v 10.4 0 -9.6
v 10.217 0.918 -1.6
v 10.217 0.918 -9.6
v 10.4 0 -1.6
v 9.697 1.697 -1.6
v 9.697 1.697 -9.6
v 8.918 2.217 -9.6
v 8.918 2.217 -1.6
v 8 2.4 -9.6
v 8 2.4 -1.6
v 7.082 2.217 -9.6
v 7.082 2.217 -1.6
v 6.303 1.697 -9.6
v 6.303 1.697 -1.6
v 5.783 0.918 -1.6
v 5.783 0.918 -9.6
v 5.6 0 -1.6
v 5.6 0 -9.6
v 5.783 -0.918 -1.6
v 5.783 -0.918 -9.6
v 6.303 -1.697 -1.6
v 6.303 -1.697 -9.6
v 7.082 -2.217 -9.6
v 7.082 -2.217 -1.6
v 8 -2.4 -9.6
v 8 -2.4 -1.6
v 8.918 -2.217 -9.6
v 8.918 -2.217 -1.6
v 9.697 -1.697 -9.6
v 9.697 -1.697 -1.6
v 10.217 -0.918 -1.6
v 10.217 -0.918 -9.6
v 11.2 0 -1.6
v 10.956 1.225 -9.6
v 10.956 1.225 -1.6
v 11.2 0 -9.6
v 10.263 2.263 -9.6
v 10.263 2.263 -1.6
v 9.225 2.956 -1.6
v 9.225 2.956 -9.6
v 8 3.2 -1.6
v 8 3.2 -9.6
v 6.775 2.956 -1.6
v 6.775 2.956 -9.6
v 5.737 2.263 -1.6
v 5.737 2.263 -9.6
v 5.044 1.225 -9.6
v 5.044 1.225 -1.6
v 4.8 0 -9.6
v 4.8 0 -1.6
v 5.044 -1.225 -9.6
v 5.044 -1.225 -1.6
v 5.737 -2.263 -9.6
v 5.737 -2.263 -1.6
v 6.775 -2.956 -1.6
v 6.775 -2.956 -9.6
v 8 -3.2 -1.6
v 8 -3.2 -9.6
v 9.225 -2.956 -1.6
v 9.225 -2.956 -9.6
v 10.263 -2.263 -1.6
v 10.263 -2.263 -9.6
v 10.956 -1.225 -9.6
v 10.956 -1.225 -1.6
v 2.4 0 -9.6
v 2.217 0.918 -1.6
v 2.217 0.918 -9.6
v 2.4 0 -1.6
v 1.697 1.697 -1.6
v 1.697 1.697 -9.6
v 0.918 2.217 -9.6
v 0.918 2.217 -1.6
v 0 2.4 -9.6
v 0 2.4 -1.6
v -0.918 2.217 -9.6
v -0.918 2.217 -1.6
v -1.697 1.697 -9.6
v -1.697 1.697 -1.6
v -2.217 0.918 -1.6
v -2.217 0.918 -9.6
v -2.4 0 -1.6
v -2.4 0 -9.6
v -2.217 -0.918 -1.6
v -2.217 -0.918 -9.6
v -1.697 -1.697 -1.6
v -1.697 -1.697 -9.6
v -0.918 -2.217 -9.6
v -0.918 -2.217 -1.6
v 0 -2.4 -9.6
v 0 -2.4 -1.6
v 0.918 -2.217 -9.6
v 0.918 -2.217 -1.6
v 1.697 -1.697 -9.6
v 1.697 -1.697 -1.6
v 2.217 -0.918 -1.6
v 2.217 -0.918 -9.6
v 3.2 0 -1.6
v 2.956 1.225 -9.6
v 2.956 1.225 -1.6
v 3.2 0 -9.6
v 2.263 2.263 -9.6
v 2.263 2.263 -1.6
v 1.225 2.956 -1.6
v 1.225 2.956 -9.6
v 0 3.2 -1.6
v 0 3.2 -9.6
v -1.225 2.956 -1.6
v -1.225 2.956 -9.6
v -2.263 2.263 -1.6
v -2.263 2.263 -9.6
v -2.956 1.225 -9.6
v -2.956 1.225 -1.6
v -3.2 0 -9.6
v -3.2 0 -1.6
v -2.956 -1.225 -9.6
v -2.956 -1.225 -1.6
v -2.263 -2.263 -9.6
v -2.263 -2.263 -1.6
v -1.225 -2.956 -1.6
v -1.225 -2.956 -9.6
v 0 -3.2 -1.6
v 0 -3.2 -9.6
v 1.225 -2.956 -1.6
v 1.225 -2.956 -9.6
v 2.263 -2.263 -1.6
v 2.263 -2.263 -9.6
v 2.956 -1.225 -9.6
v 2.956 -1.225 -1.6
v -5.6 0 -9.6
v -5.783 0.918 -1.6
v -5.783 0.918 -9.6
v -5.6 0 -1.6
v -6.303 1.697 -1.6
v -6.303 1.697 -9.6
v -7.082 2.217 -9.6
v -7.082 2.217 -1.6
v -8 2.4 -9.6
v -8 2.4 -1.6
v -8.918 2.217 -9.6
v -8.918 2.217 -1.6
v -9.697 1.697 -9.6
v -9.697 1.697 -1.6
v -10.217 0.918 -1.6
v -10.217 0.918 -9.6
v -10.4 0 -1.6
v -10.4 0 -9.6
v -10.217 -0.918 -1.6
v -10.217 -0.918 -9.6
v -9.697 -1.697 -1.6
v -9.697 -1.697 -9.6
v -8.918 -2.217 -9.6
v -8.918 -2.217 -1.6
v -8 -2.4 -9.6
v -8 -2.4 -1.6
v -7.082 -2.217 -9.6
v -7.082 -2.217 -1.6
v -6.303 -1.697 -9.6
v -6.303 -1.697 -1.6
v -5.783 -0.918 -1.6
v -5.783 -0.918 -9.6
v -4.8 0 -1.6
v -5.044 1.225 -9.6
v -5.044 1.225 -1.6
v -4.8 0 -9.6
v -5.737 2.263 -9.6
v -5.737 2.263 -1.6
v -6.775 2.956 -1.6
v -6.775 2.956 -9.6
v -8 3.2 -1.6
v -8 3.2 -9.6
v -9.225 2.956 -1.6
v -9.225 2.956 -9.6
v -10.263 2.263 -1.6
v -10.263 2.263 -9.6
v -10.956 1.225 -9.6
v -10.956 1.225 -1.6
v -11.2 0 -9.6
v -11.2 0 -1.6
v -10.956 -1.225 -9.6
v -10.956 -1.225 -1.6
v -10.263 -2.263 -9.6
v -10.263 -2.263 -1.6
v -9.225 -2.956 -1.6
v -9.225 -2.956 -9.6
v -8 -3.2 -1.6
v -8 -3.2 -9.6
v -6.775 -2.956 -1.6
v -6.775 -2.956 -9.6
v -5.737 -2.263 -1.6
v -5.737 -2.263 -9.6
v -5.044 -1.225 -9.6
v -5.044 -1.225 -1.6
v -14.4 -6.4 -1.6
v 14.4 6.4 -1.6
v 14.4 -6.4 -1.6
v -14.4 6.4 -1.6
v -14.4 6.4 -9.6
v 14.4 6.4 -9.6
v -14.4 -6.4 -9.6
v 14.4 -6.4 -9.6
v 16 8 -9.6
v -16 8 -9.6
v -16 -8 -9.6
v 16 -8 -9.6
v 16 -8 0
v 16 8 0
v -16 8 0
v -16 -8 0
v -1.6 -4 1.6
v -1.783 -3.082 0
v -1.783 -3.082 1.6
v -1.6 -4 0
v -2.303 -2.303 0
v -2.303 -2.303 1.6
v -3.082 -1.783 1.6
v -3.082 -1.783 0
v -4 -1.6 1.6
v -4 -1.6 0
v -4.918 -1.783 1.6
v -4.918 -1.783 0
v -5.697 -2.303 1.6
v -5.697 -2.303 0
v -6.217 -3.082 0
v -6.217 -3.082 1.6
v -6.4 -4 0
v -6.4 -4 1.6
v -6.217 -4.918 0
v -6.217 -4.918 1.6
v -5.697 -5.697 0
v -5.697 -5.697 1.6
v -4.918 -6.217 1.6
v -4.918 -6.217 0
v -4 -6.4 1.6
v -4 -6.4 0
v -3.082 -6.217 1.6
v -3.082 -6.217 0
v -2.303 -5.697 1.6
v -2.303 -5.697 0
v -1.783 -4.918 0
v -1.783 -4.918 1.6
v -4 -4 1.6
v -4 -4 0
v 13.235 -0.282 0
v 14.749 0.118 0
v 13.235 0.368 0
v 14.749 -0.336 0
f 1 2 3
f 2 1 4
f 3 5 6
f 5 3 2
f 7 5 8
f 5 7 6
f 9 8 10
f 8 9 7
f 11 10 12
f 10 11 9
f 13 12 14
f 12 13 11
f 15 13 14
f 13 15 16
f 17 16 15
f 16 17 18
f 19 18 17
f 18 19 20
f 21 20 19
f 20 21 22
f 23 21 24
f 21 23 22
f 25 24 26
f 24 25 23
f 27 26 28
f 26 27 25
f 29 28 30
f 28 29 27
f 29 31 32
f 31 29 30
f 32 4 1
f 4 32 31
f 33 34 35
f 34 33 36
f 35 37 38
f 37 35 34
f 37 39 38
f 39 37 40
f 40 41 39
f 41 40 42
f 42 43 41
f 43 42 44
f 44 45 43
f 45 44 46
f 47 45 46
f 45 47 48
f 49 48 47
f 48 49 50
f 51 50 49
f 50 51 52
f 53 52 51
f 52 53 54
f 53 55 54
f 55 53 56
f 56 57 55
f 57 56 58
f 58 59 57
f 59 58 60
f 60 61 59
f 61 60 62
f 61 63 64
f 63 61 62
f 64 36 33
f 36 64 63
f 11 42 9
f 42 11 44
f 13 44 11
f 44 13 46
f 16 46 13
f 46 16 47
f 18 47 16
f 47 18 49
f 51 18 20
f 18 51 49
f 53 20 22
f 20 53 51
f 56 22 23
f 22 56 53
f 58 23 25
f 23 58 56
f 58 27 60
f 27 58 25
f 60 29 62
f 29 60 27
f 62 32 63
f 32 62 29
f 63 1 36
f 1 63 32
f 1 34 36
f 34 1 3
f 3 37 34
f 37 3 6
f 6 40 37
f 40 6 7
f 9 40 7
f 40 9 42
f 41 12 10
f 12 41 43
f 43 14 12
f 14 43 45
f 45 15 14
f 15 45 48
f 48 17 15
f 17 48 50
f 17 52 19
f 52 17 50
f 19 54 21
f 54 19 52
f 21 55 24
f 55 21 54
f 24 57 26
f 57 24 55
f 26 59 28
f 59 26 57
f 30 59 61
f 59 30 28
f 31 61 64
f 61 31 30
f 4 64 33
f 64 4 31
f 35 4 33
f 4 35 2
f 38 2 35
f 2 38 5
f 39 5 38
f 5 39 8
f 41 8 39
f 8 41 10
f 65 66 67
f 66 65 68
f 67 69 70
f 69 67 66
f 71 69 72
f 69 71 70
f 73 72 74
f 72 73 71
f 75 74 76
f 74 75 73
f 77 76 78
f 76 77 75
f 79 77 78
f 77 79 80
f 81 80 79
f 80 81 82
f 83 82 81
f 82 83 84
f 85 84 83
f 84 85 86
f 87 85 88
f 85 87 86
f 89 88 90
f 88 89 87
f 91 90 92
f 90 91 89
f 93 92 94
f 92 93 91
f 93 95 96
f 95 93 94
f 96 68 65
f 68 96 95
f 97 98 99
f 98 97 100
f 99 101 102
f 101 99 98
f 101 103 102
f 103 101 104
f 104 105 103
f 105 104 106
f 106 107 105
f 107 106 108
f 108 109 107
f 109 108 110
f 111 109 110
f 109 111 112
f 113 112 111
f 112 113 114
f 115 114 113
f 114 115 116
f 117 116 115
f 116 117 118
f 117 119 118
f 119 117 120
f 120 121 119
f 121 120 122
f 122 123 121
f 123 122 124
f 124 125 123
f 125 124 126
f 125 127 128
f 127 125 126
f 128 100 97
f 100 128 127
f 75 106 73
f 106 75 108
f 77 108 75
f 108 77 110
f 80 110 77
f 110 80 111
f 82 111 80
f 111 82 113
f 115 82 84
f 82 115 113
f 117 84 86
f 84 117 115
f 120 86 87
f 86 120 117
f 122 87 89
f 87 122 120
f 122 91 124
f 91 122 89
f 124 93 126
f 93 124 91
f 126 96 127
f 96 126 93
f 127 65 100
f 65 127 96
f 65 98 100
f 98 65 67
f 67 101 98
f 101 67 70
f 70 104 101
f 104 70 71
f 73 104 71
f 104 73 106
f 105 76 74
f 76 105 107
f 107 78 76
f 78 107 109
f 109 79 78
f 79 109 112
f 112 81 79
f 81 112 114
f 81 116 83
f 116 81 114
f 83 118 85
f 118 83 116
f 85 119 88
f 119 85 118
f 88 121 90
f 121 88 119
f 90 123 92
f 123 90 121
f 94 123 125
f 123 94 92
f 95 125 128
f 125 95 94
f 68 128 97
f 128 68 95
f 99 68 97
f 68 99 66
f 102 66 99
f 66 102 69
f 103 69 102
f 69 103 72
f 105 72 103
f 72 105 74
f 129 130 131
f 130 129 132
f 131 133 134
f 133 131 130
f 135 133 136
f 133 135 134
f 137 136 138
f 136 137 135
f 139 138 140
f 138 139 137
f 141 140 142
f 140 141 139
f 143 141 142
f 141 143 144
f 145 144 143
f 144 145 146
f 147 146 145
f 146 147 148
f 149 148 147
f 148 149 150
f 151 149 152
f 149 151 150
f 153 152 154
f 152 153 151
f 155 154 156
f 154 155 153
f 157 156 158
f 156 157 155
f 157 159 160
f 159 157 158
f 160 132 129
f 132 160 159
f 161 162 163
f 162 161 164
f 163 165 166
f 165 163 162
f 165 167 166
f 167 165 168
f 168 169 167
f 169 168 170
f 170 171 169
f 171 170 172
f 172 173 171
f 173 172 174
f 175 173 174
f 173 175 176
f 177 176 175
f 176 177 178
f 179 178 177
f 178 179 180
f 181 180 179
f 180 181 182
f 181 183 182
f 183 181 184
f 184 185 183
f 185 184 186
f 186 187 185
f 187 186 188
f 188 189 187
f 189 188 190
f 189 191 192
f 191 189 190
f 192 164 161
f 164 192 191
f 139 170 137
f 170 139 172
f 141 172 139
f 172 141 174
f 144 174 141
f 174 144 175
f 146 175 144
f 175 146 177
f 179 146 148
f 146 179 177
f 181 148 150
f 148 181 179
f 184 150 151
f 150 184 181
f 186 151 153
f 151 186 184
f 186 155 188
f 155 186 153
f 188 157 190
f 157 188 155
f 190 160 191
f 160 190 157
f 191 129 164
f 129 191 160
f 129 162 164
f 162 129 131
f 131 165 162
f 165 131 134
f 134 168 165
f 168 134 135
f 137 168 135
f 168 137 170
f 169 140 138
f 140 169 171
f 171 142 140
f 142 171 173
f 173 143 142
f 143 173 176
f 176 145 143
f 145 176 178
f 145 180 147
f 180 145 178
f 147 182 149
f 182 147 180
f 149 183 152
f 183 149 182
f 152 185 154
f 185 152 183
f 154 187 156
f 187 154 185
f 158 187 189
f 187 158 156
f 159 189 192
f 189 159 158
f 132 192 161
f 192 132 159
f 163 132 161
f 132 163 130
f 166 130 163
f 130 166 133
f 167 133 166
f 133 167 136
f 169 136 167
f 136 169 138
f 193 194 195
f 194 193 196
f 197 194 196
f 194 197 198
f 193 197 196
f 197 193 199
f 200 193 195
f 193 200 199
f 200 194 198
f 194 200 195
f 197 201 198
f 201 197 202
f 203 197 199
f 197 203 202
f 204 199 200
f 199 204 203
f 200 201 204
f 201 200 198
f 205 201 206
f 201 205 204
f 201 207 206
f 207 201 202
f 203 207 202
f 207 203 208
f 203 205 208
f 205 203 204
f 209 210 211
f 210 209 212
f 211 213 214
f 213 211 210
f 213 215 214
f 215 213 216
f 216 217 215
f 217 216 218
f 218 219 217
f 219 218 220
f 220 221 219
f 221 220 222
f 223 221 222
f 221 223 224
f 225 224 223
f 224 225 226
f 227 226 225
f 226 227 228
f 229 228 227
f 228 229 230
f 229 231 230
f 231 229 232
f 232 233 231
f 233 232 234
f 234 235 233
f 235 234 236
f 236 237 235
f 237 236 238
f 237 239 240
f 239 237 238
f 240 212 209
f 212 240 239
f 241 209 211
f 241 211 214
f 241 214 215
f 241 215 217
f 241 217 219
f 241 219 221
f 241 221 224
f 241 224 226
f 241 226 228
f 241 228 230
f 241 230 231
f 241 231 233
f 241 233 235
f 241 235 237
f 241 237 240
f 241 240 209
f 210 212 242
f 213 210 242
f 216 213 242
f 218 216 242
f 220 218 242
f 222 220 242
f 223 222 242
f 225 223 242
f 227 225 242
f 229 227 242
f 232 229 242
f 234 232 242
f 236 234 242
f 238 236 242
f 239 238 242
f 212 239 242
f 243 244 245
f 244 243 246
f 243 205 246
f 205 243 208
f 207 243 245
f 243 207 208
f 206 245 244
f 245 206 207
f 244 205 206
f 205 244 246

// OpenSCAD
// file: ../p/4-4ring3.scad
use <../lib.scad>
$fa=1; $fs=0.2;
function ldraw_lib__4_4ring3(realsolid=false) = [
// 0 Ring  3 x 1.0
// 0 Name: 4-4ring3.dat
// 0 Author: James Jessiman
// 0 !LDRAW_ORG Primitive UPDATE 2009-01
// 0 !LICENSE Licensed under CC BY 2.0 and CC BY 4.0 : see CAreadme.txt
// 
// 0 BFC CERTIFY CCW
  [0,"BFC","CERTIFY"],
  [0,"BFC","CCW"],
// 
// 0 !HISTORY 1998-12-15 [PTadmin] Official Update 1998-10
// 0 !HISTORY 2002-04-05 [hafhead] Added BFC statement
// 0 !HISTORY 2002-04-25 [PTadmin] Official Update 2002-02
// 0 !HISTORY 2007-06-24 [PTadmin] Header formatted for Contributor Agreement
// 0 !HISTORY 2008-07-01 [PTadmin] Official Update 2008-01
// 0 !HISTORY 2008-08-26 [cwdee] Switch polygon winding and rename
// 0 !HISTORY 2009-05-02 [PTadmin] Official Update 2009-01
// 
// 
// 4 16 -1.5308 0 3.6956 -1.1481 0 2.7717 0 0 3 0 0 4
  [4,16,-1.5308,0,3.6956,-1.1481,0,2.7717,0,0,3,0,0,4],
// 4 16 -2.8284 0 2.8284 -2.1213 0 2.1213 -1.1481 0 2.7717 -1.5308 0 3.6956
  [4,16,-2.8284,0,2.8284,-2.1213,0,2.1213,-1.1481,0,2.7717,-1.5308,0,3.6956],
// 4 16 -3.6956 0 1.5308 -2.7717 0 1.1481 -2.1213 0 2.1213 -2.8284 0 2.8284
  [4,16,-3.6956,0,1.5308,-2.7717,0,1.1481,-2.1213,0,2.1213,-2.8284,0,2.8284],
// 4 16 -4 0 0 -3 0 0 -2.7717 0 1.1481 -3.6956 0 1.5308
  [4,16,-4,0,0,-3,0,0,-2.7717,0,1.1481,-3.6956,0,1.5308],
// 4 16 -3.6956 0 -1.5308 -2.7717 0 -1.1481 -3 0 0 -4 0 0
  [4,16,-3.6956,0,-1.5308,-2.7717,0,-1.1481,-3,0,0,-4,0,0],
// 4 16 -2.8284 0 -2.8284 -2.1213 0 -2.1213 -2.7717 0 -1.1481 -3.6956 0 -1.5308
  [4,16,-2.8284,0,-2.8284,-2.1213,0,-2.1213,-2.7717,0,-1.1481,-3.6956,0,-1.5308],
// 4 16 -1.5308 0 -3.6956 -1.1481 0 -2.7717 -2.1213 0 -2.1213 -2.8284 0 -2.8284
  [4,16,-1.5308,0,-3.6956,-1.1481,0,-2.7717,-2.1213,0,-2.1213,-2.8284,0,-2.8284],
// 4 16 0 0 -4 0 0 -3 -1.1481 0 -2.7717 -1.5308 0 -3.6956
  [4,16,0,0,-4,0,0,-3,-1.1481,0,-2.7717,-1.5308,0,-3.6956],
// 4 16 1.5308 0 -3.6956 1.1481 0 -2.7717 0 0 -3 0 0 -4
  [4,16,1.5308,0,-3.6956,1.1481,0,-2.7717,0,0,-3,0,0,-4],
// 4 16 2.8284 0 -2.8284 2.1213 0 -2.1213 1.1481 0 -2.7717 1.5308 0 -3.6956
  [4,16,2.8284,0,-2.8284,2.1213,0,-2.1213,1.1481,0,-2.7717,1.5308,0,-3.6956],
// 4 16 3.6956 0 -1.5308 2.7717 0 -1.1481 2.1213 0 -2.1213 2.8284 0 -2.8284
  [4,16,3.6956,0,-1.5308,2.7717,0,-1.1481,2.1213,0,-2.1213,2.8284,0,-2.8284],
// 4 16 4 0 0 3 0 0 2.7717 0 -1.1481 3.6956 0 -1.5308
  [4,16,4,0,0,3,0,0,2.7717,0,-1.1481,3.6956,0,-1.5308],
// 4 16 3.6956 0 1.5308 2.7717 0 1.1481 3 0 0 4 0 0
  [4,16,3.6956,0,1.5308,2.7717,0,1.1481,3,0,0,4,0,0],
// 4 16 2.8284 0 2.8284 2.1213 0 2.1213 2.7717 0 1.1481 3.6956 0 1.5308
  [4,16,2.8284,0,2.8284,2.1213,0,2.1213,2.7717,0,1.1481,3.6956,0,1.5308],
// 4 16 1.5308 0 3.6956 1.1481 0 2.7717 2.1213 0 2.1213 2.8284 0 2.8284
  [4,16,1.5308,0,3.6956,1.1481,0,2.7717,2.1213,0,2.1213,2.8284,0,2.8284],
// 4 16 0 0 4 0 0 3 1.1481 0 2.7717 1.5308 0 3.6956
  [4,16,0,0,4,0,0,3,1.1481,0,2.7717,1.5308,0,3.6956],
// 0
];
module ldraw_lib__4_4ring3(step=0, col=false, unit=2/5, alt=false, line=0.2, solid=!$preview)
    makepoly(ldraw_lib__4_4ring3(solid), step=step, col=col, unit=unit, alt=alt, line=line, solid=solid);
ldraw_lib__4_4ring3(line=0.2);
// file: ../p/4-4edge.scad
use <../lib.scad>
function ldraw_lib__4_4edge() = [
// 0 Circle 1.0
// 0 Name: 4-4edge.dat
// 0 Author: James Jessiman
// 0 !LDRAW_ORG Primitive UPDATE 2017-01
// 0 !LICENSE Licensed under CC BY 2.0 and CC BY 4.0 : see CAreadme.txt
// 
// 0 BFC CERTIFY CCW
  [0,"BFC","CERTIFY"],
  [0,"BFC","CCW"],
// 
// 0 !HISTORY 1998-12-15 [PTadmin] Official Update 1998-10
// 0 !HISTORY 2005-12-28 [PTadmin] Official Update 2005-01
// 0 !HISTORY 2007-06-24 [PTadmin] Header formatted for Contributor Agreement
// 0 !HISTORY 2008-07-01 [PTadmin] Official Update 2008-01
// 0 !HISTORY 2017-01-15 [Steffen] BFCed
// 0 !HISTORY 2017-12-30 [PTadmin] Official Update 2017-01
// 
// 
// 2 24 1 0 0 0.9239 0 0.3827
  [2,24,1,0,0,0.9239,0,0.3827],
// 2 24 0.9239 0 0.3827 0.7071 0 0.7071
  [2,24,0.9239,0,0.3827,0.7071,0,0.7071],
// 2 24 0.7071 0 0.7071 0.3827 0 0.9239
  [2,24,0.7071,0,0.7071,0.3827,0,0.9239],
// 2 24 0.3827 0 0.9239 0 0 1
  [2,24,0.3827,0,0.9239,0,0,1],
// 2 24 0 0 1 -0.3827 0 0.9239
  [2,24,0,0,1,-0.3827,0,0.9239],
// 2 24 -0.3827 0 0.9239 -0.7071 0 0.7071
  [2,24,-0.3827,0,0.9239,-0.7071,0,0.7071],
// 2 24 -0.7071 0 0.7071 -0.9239 0 0.3827
  [2,24,-0.7071,0,0.7071,-0.9239,0,0.3827],
// 2 24 -0.9239 0 0.3827 -1 0 -0
  [2,24,-0.9239,0,0.3827,-1,0,-0],
// 2 24 -1 0 -0 -0.9239 0 -0.3827
  [2,24,-1,0,-0,-0.9239,0,-0.3827],
// 2 24 -0.9239 0 -0.3827 -0.7071 0 -0.7071
  [2,24,-0.9239,0,-0.3827,-0.7071,0,-0.7071],
// 2 24 -0.7071 0 -0.7071 -0.3827 0 -0.9239
  [2,24,-0.7071,0,-0.7071,-0.3827,0,-0.9239],
// 2 24 -0.3827 0 -0.9239 0 0 -1
  [2,24,-0.3827,0,-0.9239,0,0,-1],
// 2 24 0 0 -1 0.3827 0 -0.9239
  [2,24,0,0,-1,0.3827,0,-0.9239],
// 2 24 0.3827 0 -0.9239 0.7071 0 -0.7071
  [2,24,0.3827,0,-0.9239,0.7071,0,-0.7071],
// 2 24 0.7071 0 -0.7071 0.9239 0 -0.3827
  [2,24,0.7071,0,-0.7071,0.9239,0,-0.3827],
// 2 24 0.9239 0 -0.3827 1 0 0
  [2,24,0.9239,0,-0.3827,1,0,0],
];
module ldraw_lib__4_4edge(step=0, col=false, unit=2/5, alt=false, line=0.2, solid=!$preview)
    makepoly(ldraw_lib__4_4edge(), step=step, col=col, unit=unit, alt=alt, line=line, solid=solid);
ldraw_lib__4_4edge(line=0.2);
// file: ../p/4-4disc.scad
use <../lib.scad>
function ldraw_lib__4_4disc() = [
// 0 Disc 1.0
// 0 Name: 4-4disc.dat
// 0 Author: James Jessiman
// 0 !LDRAW_ORG Primitive UPDATE 2002-02
// 0 !LICENSE Licensed under CC BY 2.0 and CC BY 4.0 : see CAreadme.txt
// 
// 0 BFC CERTIFY CCW
  [0,"BFC","CERTIFY"],
  [0,"BFC","CCW"],
// 
// 0 !HISTORY 1998-12-15 [PTadmin] Official Update 1998-10
// 0 !HISTORY 2002-03-23 [sbliss] Added BFC statement
// 0 !HISTORY 2002-04-25 [PTadmin] Official Update 2002-02
// 0 !HISTORY 2007-06-24 [PTadmin] Header formatted for Contributor Agreement
// 0 !HISTORY 2008-07-01 [PTadmin] Official Update 2008-01
// 
// 
// 3 16 0 0 0 1 0 0 0.9239 0 0.3827
  [3,16,0,0,0,1,0,0,0.9239,0,0.3827],
// 3 16 0 0 0 0.9239 0 0.3827 0.7071 0 0.7071
  [3,16,0,0,0,0.9239,0,0.3827,0.7071,0,0.7071],
// 3 16 0 0 0 0.7071 0 0.7071 0.3827 0 0.9239
  [3,16,0,0,0,0.7071,0,0.7071,0.3827,0,0.9239],
// 3 16 0 0 0 0.3827 0 0.9239 0 0 1
  [3,16,0,0,0,0.3827,0,0.9239,0,0,1],
// 3 16 0 0 0 0 0 1 -0.3827 0 0.9239
  [3,16,0,0,0,0,0,1,-0.3827,0,0.9239],
// 3 16 0 0 0 -0.3827 0 0.9239 -0.7071 0 0.7071
  [3,16,0,0,0,-0.3827,0,0.9239,-0.7071,0,0.7071],
// 3 16 0 0 0 -0.7071 0 0.7071 -0.9239 0 0.3827
  [3,16,0,0,0,-0.7071,0,0.7071,-0.9239,0,0.3827],
// 3 16 0 0 0 -0.9239 0 0.3827 -1 0 -0
  [3,16,0,0,0,-0.9239,0,0.3827,-1,0,-0],
// 3 16 0 0 0 -1 0 -0 -0.9239 0 -0.3827
  [3,16,0,0,0,-1,0,-0,-0.9239,0,-0.3827],
// 3 16 0 0 0 -0.9239 0 -0.3827 -0.7071 0 -0.7071
  [3,16,0,0,0,-0.9239,0,-0.3827,-0.7071,0,-0.7071],
// 3 16 0 0 0 -0.7071 0 -0.7071 -0.3827 0 -0.9239
  [3,16,0,0,0,-0.7071,0,-0.7071,-0.3827,0,-0.9239],
// 3 16 0 0 0 -0.3827 0 -0.9239 0 0 -1
  [3,16,0,0,0,-0.3827,0,-0.9239,0,0,-1],
// 3 16 0 0 0 0 0 -1 0.3827 0 -0.9239
  [3,16,0,0,0,0,0,-1,0.3827,0,-0.9239],
// 3 16 0 0 0 0.3827 0 -0.9239 0.7071 0 -0.7071
  [3,16,0,0,0,0.3827,0,-0.9239,0.7071,0,-0.7071],
// 3 16 0 0 0 0.7071 0 -0.7071 0.9239 0 -0.3827
  [3,16,0,0,0,0.7071,0,-0.7071,0.9239,0,-0.3827],
// 3 16 0 0 0 0.9239 0 -0.3827 1 0 0
  [3,16,0,0,0,0.9239,0,-0.3827,1,0,0],
// 0
];
module ldraw_lib__4_4disc(step=0, col=false, unit=2/5, alt=false, line=0.2, solid=!$preview)
    makepoly(ldraw_lib__4_4disc(), step=step, col=col, unit=unit, alt=alt, line=line, solid=solid);
ldraw_lib__4_4disc(line=0.2);
// file: ../p/4-4cyli.scad
use <../lib.scad>
$fa=1; $fs=0.2;
function ldraw_lib__4_4cyli(realsolid=false) = [
// 0 Cylinder 1.0
// 0 Name: 4-4cyli.dat
// 0 Author: James Jessiman
// 0 !LDRAW_ORG Primitive UPDATE 2005-01
// 0 !LICENSE Licensed under CC BY 2.0 and CC BY 4.0 : see CAreadme.txt
// 
// 0 BFC CERTIFY CCW
  [0,"BFC","CERTIFY"],
  [0,"BFC","CCW"],
// 
// 0 !HISTORY 1998-12-15 [PTadmin] Official Update 1998-10
// 0 !HISTORY 2002-03-23 [sbliss] Added BFC statement; merged headers from files in distributions LDraw 0.27 and Complete.
// 0 !HISTORY 2002-04-25 [PTadmin] Official Update 2002-02
// 0 !HISTORY 2004-12-14 [guyvivan] BFC CCW
// 0 !HISTORY 2005-12-28 [PTadmin] Official Update 2005-01
// 0 !HISTORY 2007-06-24 [PTadmin] Header formatted for Contributor Agreement
// 0 !HISTORY 2008-07-01 [PTadmin] Official Update 2008-01
// 
// 
// 4 16 1 1 0 0.9239 1 0.3827 0.9239 0 0.3827 1 0 0
  [4,16,1,1,0,0.9239,1,0.3827,0.9239,0,0.3827,1,0,0],
// 5 24 1 0 0 1 1 0 0.9239 0 0.3827 0.9239 0 -0.3827
  [5,24,1,0,0,1,1,0,0.9239,0,0.3827,0.9239,0,-0.3827],
// 4 16 0.9239 1 0.3827 0.7071 1 0.7071 0.7071 0 0.7071 0.9239 0 0.3827
  [4,16,0.9239,1,0.3827,0.7071,1,0.7071,0.7071,0,0.7071,0.9239,0,0.3827],
// 5 24 0.9239 0 0.3827 0.9239 1 0.3827 0.7071 0 0.7071 1 0 0
  [5,24,0.9239,0,0.3827,0.9239,1,0.3827,0.7071,0,0.7071,1,0,0],
// 4 16 0.7071 1 0.7071 0.3827 1 0.9239 0.3827 0 0.9239 0.7071 0 0.7071
  [4,16,0.7071,1,0.7071,0.3827,1,0.9239,0.3827,0,0.9239,0.7071,0,0.7071],
// 5 24 0.7071 0 0.7071 0.7071 1 0.7071 0.3827 0 0.9239 0.9239 0 0.3827
  [5,24,0.7071,0,0.7071,0.7071,1,0.7071,0.3827,0,0.9239,0.9239,0,0.3827],
// 4 16 0.3827 1 0.9239 0 1 1 0 0 1 0.3827 0 0.9239
  [4,16,0.3827,1,0.9239,0,1,1,0,0,1,0.3827,0,0.9239],
// 5 24 0.3827 0 0.9239 0.3827 1 0.9239 0 0 1 0.7071 0 0.7071
  [5,24,0.3827,0,0.9239,0.3827,1,0.9239,0,0,1,0.7071,0,0.7071],
// 4 16 0 1 1 -0.3827 1 0.9239 -0.3827 0 0.9239 0 0 1
  [4,16,0,1,1,-0.3827,1,0.9239,-0.3827,0,0.9239,0,0,1],
// 5 24 0 0 1 0 1 1 -0.3827 0 0.9239 0.3827 0 0.9239
  [5,24,0,0,1,0,1,1,-0.3827,0,0.9239,0.3827,0,0.9239],
// 4 16 -0.3827 1 0.9239 -0.7071 1 0.7071 -0.7071 0 0.7071 -0.3827 0 0.9239
  [4,16,-0.3827,1,0.9239,-0.7071,1,0.7071,-0.7071,0,0.7071,-0.3827,0,0.9239],
// 5 24 -0.3827 0 0.9239 -0.3827 1 0.9239 -0.7071 0 0.7071 0 0 1
  [5,24,-0.3827,0,0.9239,-0.3827,1,0.9239,-0.7071,0,0.7071,0,0,1],
// 4 16 -0.7071 1 0.7071 -0.9239 1 0.3827 -0.9239 0 0.3827 -0.7071 0 0.7071
  [4,16,-0.7071,1,0.7071,-0.9239,1,0.3827,-0.9239,0,0.3827,-0.7071,0,0.7071],
// 5 24 -0.7071 0 0.7071 -0.7071 1 0.7071 -0.9239 0 0.3827 -0.3827 0 0.9239
  [5,24,-0.7071,0,0.7071,-0.7071,1,0.7071,-0.9239,0,0.3827,-0.3827,0,0.9239],
// 4 16 -0.9239 1 0.3827 -1 1 0 -1 0 0 -0.9239 0 0.3827
  [4,16,-0.9239,1,0.3827,-1,1,0,-1,0,0,-0.9239,0,0.3827],
// 5 24 -0.9239 0 0.3827 -0.9239 1 0.3827 -1 0 0 -0.7071 0 0.7071
  [5,24,-0.9239,0,0.3827,-0.9239,1,0.3827,-1,0,0,-0.7071,0,0.7071],
// 4 16 -1 1 0 -0.9239 1 -0.3827 -0.9239 0 -0.3827 -1 0 0
  [4,16,-1,1,0,-0.9239,1,-0.3827,-0.9239,0,-0.3827,-1,0,0],
// 5 24 -1 0 0 -1 1 0 -0.9239 0 -0.3827 -0.9239 0 0.3827
  [5,24,-1,0,0,-1,1,0,-0.9239,0,-0.3827,-0.9239,0,0.3827],
// 4 16 -0.9239 1 -0.3827 -0.7071 1 -0.7071 -0.7071 0 -0.7071 -0.9239 0 -0.3827
  [4,16,-0.9239,1,-0.3827,-0.7071,1,-0.7071,-0.7071,0,-0.7071,-0.9239,0,-0.3827],
// 5 24 -0.9239 0 -0.3827 -0.9239 1 -0.3827 -0.7071 0 -0.7071 -1 0 0
  [5,24,-0.9239,0,-0.3827,-0.9239,1,-0.3827,-0.7071,0,-0.7071,-1,0,0],
// 4 16 -0.7071 1 -0.7071 -0.3827 1 -0.9239 -0.3827 0 -0.9239 -0.7071 0 -0.7071
  [4,16,-0.7071,1,-0.7071,-0.3827,1,-0.9239,-0.3827,0,-0.9239,-0.7071,0,-0.7071],
// 5 24 -0.7071 0 -0.7071 -0.7071 1 -0.7071 -0.3827 0 -0.9239 -0.9239 0 -0.3827
  [5,24,-0.7071,0,-0.7071,-0.7071,1,-0.7071,-0.3827,0,-0.9239,-0.9239,0,-0.3827],
// 4 16 -0.3827 1 -0.9239 0 1 -1 0 0 -1 -0.3827 0 -0.9239
  [4,16,-0.3827,1,-0.9239,0,1,-1,0,0,-1,-0.3827,0,-0.9239],
// 5 24 -0.3827 0 -0.9239 -0.3827 1 -0.9239 0 0 -1 -0.7071 0 -0.7071
  [5,24,-0.3827,0,-0.9239,-0.3827,1,-0.9239,0,0,-1,-0.7071,0,-0.7071],
// 4 16 0 1 -1 0.3827 1 -0.9239 0.3827 0 -0.9239 0 0 -1
  [4,16,0,1,-1,0.3827,1,-0.9239,0.3827,0,-0.9239,0,0,-1],
// 5 24 0 0 -1 0 1 -1 0.3827 0 -0.9239 -0.3827 0 -0.9239
  [5,24,0,0,-1,0,1,-1,0.3827,0,-0.9239,-0.3827,0,-0.9239],
// 4 16 0.3827 1 -0.9239 0.7071 1 -0.7071 0.7071 0 -0.7071 0.3827 0 -0.9239
  [4,16,0.3827,1,-0.9239,0.7071,1,-0.7071,0.7071,0,-0.7071,0.3827,0,-0.9239],
// 5 24 0.3827 0 -0.9239 0.3827 1 -0.9239 0.7071 0 -0.7071 0 0 -1
  [5,24,0.3827,0,-0.9239,0.3827,1,-0.9239,0.7071,0,-0.7071,0,0,-1],
// 4 16 0.7071 1 -0.7071 0.9239 1 -0.3827 0.9239 0 -0.3827 0.7071 0 -0.7071
  [4,16,0.7071,1,-0.7071,0.9239,1,-0.3827,0.9239,0,-0.3827,0.7071,0,-0.7071],
// 5 24 0.7071 0 -0.7071 0.7071 1 -0.7071 0.9239 0 -0.3827 0.3827 0 -0.9239
  [5,24,0.7071,0,-0.7071,0.7071,1,-0.7071,0.9239,0,-0.3827,0.3827,0,-0.9239],
// 4 16 0.9239 1 -0.3827 1 1 0 1 0 0 0.9239 0 -0.3827
  [4,16,0.9239,1,-0.3827,1,1,0,1,0,0,0.9239,0,-0.3827],
// 5 24 0.9239 0 -0.3827 0.9239 1 -0.3827 1 0 0 0.7071 0 -0.7071
  [5,24,0.9239,0,-0.3827,0.9239,1,-0.3827,1,0,0,0.7071,0,-0.7071],
// 0
];
module ldraw_lib__4_4cyli(step=0, col=false, unit=2/5, alt=false, line=0.2, solid=!$preview)
    makepoly(ldraw_lib__4_4cyli(solid), step=step, col=col, unit=unit, alt=alt, line=line, solid=solid);
ldraw_lib__4_4cyli(line=0.2);
// file: ../p/stud4.scad
use <../lib.scad>
use <4-4cyli.scad>
use <4-4edge.scad>
use <4-4ring3.scad>
function ldraw_lib__stud4() = [
// 0 Stud Tube Open
// 0 Name: stud4.dat
// 0 Author: James Jessiman
// 0 !LDRAW_ORG Primitive UPDATE 2009-02
// 0 !LICENSE Licensed under CC BY 4.0 : see CAreadme.txt
// 
// 0 BFC CERTIFY CCW
  [0,"BFC","CERTIFY"],
  [0,"BFC","CCW"],
// 
// 0 !HISTORY 1999-07-05 [PTadmin] Official Update 1999-05
// 0 !HISTORY 2002-04-04 [sbliss] Modified for BFC compliance
// 0 !HISTORY 2002-04-25 [PTadmin] Official Update 2002-02
// 0 !HISTORY 2007-06-24 [PTadmin] Header formatted for Contributor Agreement
// 0 !HISTORY 2008-07-01 [PTadmin] Official Update 2008-01
// 0 !HISTORY 2009-06-21 [cwdee] Update ring references to 4-4ring
// 0 !HISTORY 2009-09-03 [PTadmin] Official Update 2009-02
// 
// 
// 1 16 0 -4 0 6 0 0 0 1 0 0 0 6 4-4edge.dat
  [1,16,0,-4,0,6,0,0,0,1,0,0,0,6, ldraw_lib__4_4edge()],
// 1 16 0 -4 0 8 0 0 0 1 0 0 0 8 4-4edge.dat
  [1,16,0,-4,0,8,0,0,0,1,0,0,0,8, ldraw_lib__4_4edge()],
// 1 16 0 0 0 6 0 0 0 1 0 0 0 6 4-4edge.dat
  [1,16,0,0,0,6,0,0,0,1,0,0,0,6, ldraw_lib__4_4edge()],
// 1 16 0 0 0 8 0 0 0 1 0 0 0 8 4-4edge.dat
  [1,16,0,0,0,8,0,0,0,1,0,0,0,8, ldraw_lib__4_4edge()],
// 0 BFC INVERTNEXT
  [0,"BFC","INVERTNEXT"],
// 1 16 0 -4 0 6 0 0 0 4 0 0 0 6 4-4cyli.dat
  [1,16,0,-4,0,6,0,0,0,4,0,0,0,6, ldraw_lib__4_4cyli()],
// 1 16 0 -4 0 8 0 0 0 4 0 0 0 8 4-4cyli.dat
  [1,16,0,-4,0,8,0,0,0,4,0,0,0,8, ldraw_lib__4_4cyli()],
// 1 16 0 -4 0 2 0 0 0 1 0 0 0 2 4-4ring3.dat
  [1,16,0,-4,0,2,0,0,0,1,0,0,0,2, ldraw_lib__4_4ring3()],
  [-1,16,0,0,0,2,0,0,0,-1,0,0,0,2, ldraw_lib__4_4ring3()],
// 0
];
module ldraw_lib__stud4(step=0, col=false, unit=2/5, alt=false, line=0.2, solid=!$preview)
    makepoly(ldraw_lib__stud4(), step=step, col=col, unit=unit, alt=alt, line=line, solid=solid);
ldraw_lib__stud4(line=0.2);
// file: ../p/box5.scad
use <../lib.scad>
function ldraw_lib__box5() = [
// 0 Box with 5 Faces and All Edges
// 0 Name: box5.dat
// 0 Author: James Jessiman
// 0 !LDRAW_ORG Primitive UPDATE 2012-01
// 0 !LICENSE Licensed under CC BY 2.0 and CC BY 4.0 : see CAreadme.txt
// 
// 0 BFC CERTIFY CCW
  [0,"BFC","CERTIFY"],
  [0,"BFC","CCW"],
// 
// 0 !HISTORY 2002-04-03 [sbliss] Modified for BFC compliance
// 0 !HISTORY 2002-04-25 [PTadmin] Official Update 2002-02
// 0 !HISTORY 2007-06-24 [PTadmin] Header formatted for Contributor Agreement
// 0 !HISTORY 2008-07-01 [PTadmin] Official Update 2008-01
// 0 !HISTORY 2012-02-16 [Philo] Changed to CCW
// 0 !HISTORY 2012-03-30 [PTadmin] Official Update 2012-01
// 
// 
// 2 24 1 1 1 -1 1 1
  [2,24,1,1,1,-1,1,1],
// 2 24 -1 1 1 -1 1 -1
  [2,24,-1,1,1,-1,1,-1],
// 2 24 -1 1 -1 1 1 -1
  [2,24,-1,1,-1,1,1,-1],
// 2 24 1 1 -1 1 1 1
  [2,24,1,1,-1,1,1,1],
// 2 24 1 0 1 -1 0 1
  [2,24,1,0,1,-1,0,1],
// 2 24 -1 0 1 -1 0 -1
  [2,24,-1,0,1,-1,0,-1],
// 2 24 -1 0 -1 1 0 -1
  [2,24,-1,0,-1,1,0,-1],
// 2 24 1 0 -1 1 0 1
  [2,24,1,0,-1,1,0,1],
// 2 24 1 0 1 1 1 1
  [2,24,1,0,1,1,1,1],
// 2 24 -1 0 1 -1 1 1
  [2,24,-1,0,1,-1,1,1],
// 2 24 1 0 -1 1 1 -1
  [2,24,1,0,-1,1,1,-1],
// 2 24 -1 0 -1 -1 1 -1
  [2,24,-1,0,-1,-1,1,-1],
// 4 16 -1 1 1 1 1 1 1 1 -1 -1 1 -1
  [4,16,-1,1,1,1,1,1,1,1,-1,-1,1,-1],
// 4 16 -1 1 1 -1 0 1 1 0 1 1 1 1
  [4,16,-1,1,1,-1,0,1,1,0,1,1,1,1],
// 4 16 -1 1 -1 -1 0 -1 -1 0 1 -1 1 1
  [4,16,-1,1,-1,-1,0,-1,-1,0,1,-1,1,1],
// 4 16 1 1 -1 1 0 -1 -1 0 -1 -1 1 -1
  [4,16,1,1,-1,1,0,-1,-1,0,-1,-1,1,-1],
// 4 16 1 1 1 1 0 1 1 0 -1 1 1 -1
  [4,16,1,1,1,1,0,1,1,0,-1,1,1,-1],
];
makepoly(ldraw_lib__box5(), line=0.2);
// file: ../p/box4.scad
use <../lib.scad>
function ldraw_lib__box4() = [
// 0 Box with 4 Faces (2 Parallel Pairs) and All Edges
// 0 Name: box4.dat
// 0 Author: James Jessiman
// 0 !LDRAW_ORG Primitive UPDATE 2012-01
// 0 !LICENSE Licensed under CC BY 4.0 : see CAreadme.txt
// 
// 0 BFC CERTIFY CCW
  [0,"BFC","CERTIFY"],
  [0,"BFC","CCW"],
// 
// 0 !HISTORY 2002-04-03 [sbliss] Modified for BFC compliance
// 0 !HISTORY 2002-04-25 [PTadmin] Official Update 2002-02
// 0 !HISTORY 2007-06-24 [PTadmin] Header formatted for Contributor Agreement
// 0 !HISTORY 2008-07-01 [PTadmin] Official Update 2008-01
// 0 !HISTORY 2012-02-16 [Philo] Changed to CCW
// 0 !HISTORY 2012-03-30 [PTadmin] Official Update 2012-01
// 
// 
// 2 24 1 1 1 -1 1 1
  [2,24,1,1,1,-1,1,1],
// 2 24 -1 1 1 -1 1 -1
  [2,24,-1,1,1,-1,1,-1],
// 2 24 -1 1 -1 1 1 -1
  [2,24,-1,1,-1,1,1,-1],
// 2 24 1 1 -1 1 1 1
  [2,24,1,1,-1,1,1,1],
// 2 24 1 0 1 -1 0 1
  [2,24,1,0,1,-1,0,1],
// 2 24 -1 0 1 -1 0 -1
  [2,24,-1,0,1,-1,0,-1],
// 2 24 -1 0 -1 1 0 -1
  [2,24,-1,0,-1,1,0,-1],
// 2 24 1 0 -1 1 0 1
  [2,24,1,0,-1,1,0,1],
// 2 24 1 0 1 1 1 1
  [2,24,1,0,1,1,1,1],
// 2 24 -1 0 1 -1 1 1
  [2,24,-1,0,1,-1,1,1],
// 2 24 1 0 -1 1 1 -1
  [2,24,1,0,-1,1,1,-1],
// 2 24 -1 0 -1 -1 1 -1
  [2,24,-1,0,-1,-1,1,-1],
// 4 16 -1 1 1 -1 0 1 1 0 1 1 1 1
  [4,16,-1,1,1,-1,0,1,1,0,1,1,1,1],
// 4 16 -1 1 -1 -1 0 -1 -1 0 1 -1 1 1
  [4,16,-1,1,-1,-1,0,-1,-1,0,1,-1,1,1],
// 4 16 1 1 -1 1 0 -1 -1 0 -1 -1 1 -1
  [4,16,1,1,-1,1,0,-1,-1,0,-1,-1,1,-1],
// 4 16 1 1 1 1 0 1 1 0 -1 1 1 -1
  [4,16,1,1,1,1,0,1,1,0,-1,1,1,-1],
];
module ldraw_lib__box4(step=0, col=false, unit=2/5, alt=false, line=0.2, solid=!$preview)
    makepoly(ldraw_lib__box4(), step=step, col=col, unit=unit, alt=alt, line=line, solid=solid);
ldraw_lib__box4(line=0.2);
// file: ../p/stud.scad
use <../lib.scad>
use <4-4cyli.scad>
use <4-4disc.scad>
use <4-4edge.scad>
function ldraw_lib__stud() = [
// 0 Stud
// 0 Name: stud.dat
// 0 Author: James Jessiman
// 0 !LDRAW_ORG Primitive UPDATE 2012-01
// 0 !LICENSE Licensed under CC BY 4.0 : see CAreadme.txt
// 
// 0 BFC CERTIFY CCW
  [0,"BFC","CERTIFY"],
  [0,"BFC","CCW"],
// 
// 0 !HISTORY 2002-04-04 [sbliss] Modified for BFC compliance
// 0 !HISTORY 2002-04-25 [PTadmin] Official Update 2002-02
// 0 !HISTORY 2007-06-24 [PTadmin] Header formatted for Contributor Agreement
// 0 !HISTORY 2008-07-01 [PTadmin] Official Update 2008-01
// 0 !HISTORY 2012-02-16 [Philo] Changed to CCW
// 0 !HISTORY 2012-03-30 [PTadmin] Official Update 2012-01
// 
// 
// 1 16 0 0 0 6 0 0 0 1 0 0 0 6 4-4edge.dat
  [1,16,0,0,0,6,0,0,0,1,0,0,0,6, ldraw_lib__4_4edge()],
// 1 16 0 -4 0 6 0 0 0 1 0 0 0 6 4-4edge.dat
  [1,16,0,-4,0,6,0,0,0,1,0,0,0,6, ldraw_lib__4_4edge()],
// 1 16 0 0 0 6 0 0 0 -4 0 0 0 6 4-4cyli.dat
  [1,16,0,0,0,6,0,0,0,-4,0,0,0,6, ldraw_lib__4_4cyli()],
// 1 16 0 -4 0 6 0 0 0 1 0 0 0 6 4-4disc.dat
  [1,16,0,-4,0,6,0,0,0,1,0,0,0,6, ldraw_lib__4_4disc()],
  [-1,16,0,0,0,6,0,0,0,-1,0,0,0,6, ldraw_lib__4_4disc()],
];
module ldraw_lib__stud(step=0, col=false, unit=2/5, alt=false, line=0.2, solid=!$preview)
    makepoly(ldraw_lib__stud(), step=step, col=col, unit=unit, alt=alt, line=line, solid=solid);
ldraw_lib__stud(line=0.2);
// file: s/3001s02.scad
use <../../lib.scad>
use <../../p/box4.scad>
use <../../p/box5.scad>
use <../../p/stud4.scad>
function ldraw_lib__s__3001s02() = [
// 0 ~Brick  2 x  4 without Top and Top Studs
// 0 Name: s\3001s02.dat
// 0 Author: Rene Rechthaler [Blechtaler]
// 0 !LDRAW_ORG Subpart UPDATE 2024-09
// 0 !LICENSE Licensed under CC BY 4.0 : see CAreadme.txt
// 
// 0 BFC CERTIFY CCW
  [0,"BFC","CERTIFY"],
  [0,"BFC","CCW"],
// 
// 0 !HISTORY 2023-11-20 [Blechtaler] made from 3001s01
// 0 !HISTORY 2024-10-27 [OrionP] Official Update 2024-09
// 
// 1 16 20 4 0 1 0 0 0 -5 0 0 0 1 stud4.dat
  [1,16,20,4,0,1,0,0,0,-5,0,0,0,1, ldraw_lib__stud4()],
// 1 16 0 4 0 1 0 0 0 -5 0 0 0 1 stud4.dat
  [1,16,0,4,0,1,0,0,0,-5,0,0,0,1, ldraw_lib__stud4()],
// 1 16 -20 4 0 1 0 0 0 -5 0 0 0 1 stud4.dat
  [1,16,-20,4,0,1,0,0,0,-5,0,0,0,1, ldraw_lib__stud4()],
// 0 BFC INVERTNEXT
  [0,"BFC","INVERTNEXT"],
// 1 16 0 24 0 36 0 0 0 -20 0 0 0 16 box5.dat
  [1,16,0,24,0,36,0,0,0,-20,0,0,0,16, ldraw_lib__box5()],
// 4 16 40 24 20 36 24 16 -36 24 16 -40 24 20
  [4,16,40,24,20,36,24,16,-36,24,16,-40,24,20],
// 4 16 -40 24 20 -36 24 16 -36 24 -16 -40 24 -20
  [4,16,-40,24,20,-36,24,16,-36,24,-16,-40,24,-20],
// 4 16 -40 24 -20 -36 24 -16 36 24 -16 40 24 -20
  [4,16,-40,24,-20,-36,24,-16,36,24,-16,40,24,-20],
// 4 16 40 24 -20 36 24 -16 36 24 16 40 24 20
  [4,16,40,24,-20,36,24,-16,36,24,16,40,24,20],
// 1 16 0 24 0 0 0 40 0 -24 0 -20 0 0 box4.dat
  [1,16,0,24,0,0,0,40,0,-24,0,-20,0,0, ldraw_lib__box4()],
];
module ldraw_lib__s__3001s02(step=0, col=false, unit=2/5, alt=false, line=0.2, solid=!$preview)
    makepoly(ldraw_lib__s__3001s02(), step=step, col=col, unit=unit, alt=alt, line=line, solid=solid);
ldraw_lib__s__3001s02(line=0.2);
// main file
use <../lib.scad>
use <s/3001s02.scad>
use <../p/stud.scad>
function ldraw_lib__65552p01() = [
// 0 Brick Braille 2 x 4 with 1 Stud (DOTS-2) with "," Pattern
// 0 Name: 65552p01.dat
// 0 Author: Rene Rechthaler [Blechtaler]
// 0 !LDRAW_ORG Part UPDATE 2025-08
// 0 !LICENSE Licensed under CC BY 4.0 : see CAreadme.txt
// 
// 0 BFC CERTIFY CCW
  [0,"BFC","CERTIFY"],
  [0,"BFC","CCW"],
// 
// 0 !KEYWORDS ⠂ Unicode U+2802 (10242), BrickLink 65551pb02, comma
// 0 !KEYWORDS Rebrickable 65551pr0002, Set 4000503, set 4000506, set 40655
// 0 !KEYWORDS set 40656, set 40722, set 40723, set 40724
// 
// 0 !HISTORY 2024-08-18 [MagFors] Changed orientation, added keywords
// 0 !HISTORY 2025-08-31 [OrionP] Official Update 2025-08
// 
// 1 16 0 0 0 1 0 0 0 1 0 0 0 1 s\3001s02.dat
  [1,16,0,0,0,1,0,0,0,1,0,0,0,1, ldraw_lib__s__3001s02()],
// 1 16 -10 0 -10 1 0 0 0 1 0 0 0 1 stud.dat
  [1,16,-10,0,-10,1,0,0,0,1,0,0,0,1, ldraw_lib__stud()],
// 
// 0 // Pattern
// 0 // Character
// 4 0 36.873 0 -.839 36.873 0 .294 33.087 0 .921 33.087 0 -.706
  [4,0,36.873,0,-.839,36.873,0,.294,33.087,0,.921,33.087,0,-.706],
// 0 // Background
// 4 16 -40 0 -20 40 0 -20 36.873 0 -.839 33.087 0 -.706
  [4,16,-40,0,-20,40,0,-20,36.873,0,-.839,33.087,0,-.706],
// 4 16 33.087 0 .921 -40 0 20 -40 0 -20 33.087 0 -.706
  [4,16,33.087,0,.921,-40,0,20,-40,0,-20,33.087,0,-.706],
// 4 16 -40 0 20 33.087 0 .921 36.873 0 .294 40 0 20
  [4,16,-40,0,20,33.087,0,.921,36.873,0,.294,40,0,20],
// 4 16 36.873 0 -.839 40 0 -20 40 0 20 36.873 0 .294
  [4,16,36.873,0,-.839,40,0,-20,40,0,20,36.873,0,.294],
];
module ldraw_lib__65552p01(step=0, col=false, unit=2/5, alt=false, line=0.2, solid=!$preview)
    makepoly(ldraw_lib__65552p01(), step=step, col=col, unit=unit, alt=alt, line=line, solid=solid);
ldraw_lib__65552p01(line=0.2);
